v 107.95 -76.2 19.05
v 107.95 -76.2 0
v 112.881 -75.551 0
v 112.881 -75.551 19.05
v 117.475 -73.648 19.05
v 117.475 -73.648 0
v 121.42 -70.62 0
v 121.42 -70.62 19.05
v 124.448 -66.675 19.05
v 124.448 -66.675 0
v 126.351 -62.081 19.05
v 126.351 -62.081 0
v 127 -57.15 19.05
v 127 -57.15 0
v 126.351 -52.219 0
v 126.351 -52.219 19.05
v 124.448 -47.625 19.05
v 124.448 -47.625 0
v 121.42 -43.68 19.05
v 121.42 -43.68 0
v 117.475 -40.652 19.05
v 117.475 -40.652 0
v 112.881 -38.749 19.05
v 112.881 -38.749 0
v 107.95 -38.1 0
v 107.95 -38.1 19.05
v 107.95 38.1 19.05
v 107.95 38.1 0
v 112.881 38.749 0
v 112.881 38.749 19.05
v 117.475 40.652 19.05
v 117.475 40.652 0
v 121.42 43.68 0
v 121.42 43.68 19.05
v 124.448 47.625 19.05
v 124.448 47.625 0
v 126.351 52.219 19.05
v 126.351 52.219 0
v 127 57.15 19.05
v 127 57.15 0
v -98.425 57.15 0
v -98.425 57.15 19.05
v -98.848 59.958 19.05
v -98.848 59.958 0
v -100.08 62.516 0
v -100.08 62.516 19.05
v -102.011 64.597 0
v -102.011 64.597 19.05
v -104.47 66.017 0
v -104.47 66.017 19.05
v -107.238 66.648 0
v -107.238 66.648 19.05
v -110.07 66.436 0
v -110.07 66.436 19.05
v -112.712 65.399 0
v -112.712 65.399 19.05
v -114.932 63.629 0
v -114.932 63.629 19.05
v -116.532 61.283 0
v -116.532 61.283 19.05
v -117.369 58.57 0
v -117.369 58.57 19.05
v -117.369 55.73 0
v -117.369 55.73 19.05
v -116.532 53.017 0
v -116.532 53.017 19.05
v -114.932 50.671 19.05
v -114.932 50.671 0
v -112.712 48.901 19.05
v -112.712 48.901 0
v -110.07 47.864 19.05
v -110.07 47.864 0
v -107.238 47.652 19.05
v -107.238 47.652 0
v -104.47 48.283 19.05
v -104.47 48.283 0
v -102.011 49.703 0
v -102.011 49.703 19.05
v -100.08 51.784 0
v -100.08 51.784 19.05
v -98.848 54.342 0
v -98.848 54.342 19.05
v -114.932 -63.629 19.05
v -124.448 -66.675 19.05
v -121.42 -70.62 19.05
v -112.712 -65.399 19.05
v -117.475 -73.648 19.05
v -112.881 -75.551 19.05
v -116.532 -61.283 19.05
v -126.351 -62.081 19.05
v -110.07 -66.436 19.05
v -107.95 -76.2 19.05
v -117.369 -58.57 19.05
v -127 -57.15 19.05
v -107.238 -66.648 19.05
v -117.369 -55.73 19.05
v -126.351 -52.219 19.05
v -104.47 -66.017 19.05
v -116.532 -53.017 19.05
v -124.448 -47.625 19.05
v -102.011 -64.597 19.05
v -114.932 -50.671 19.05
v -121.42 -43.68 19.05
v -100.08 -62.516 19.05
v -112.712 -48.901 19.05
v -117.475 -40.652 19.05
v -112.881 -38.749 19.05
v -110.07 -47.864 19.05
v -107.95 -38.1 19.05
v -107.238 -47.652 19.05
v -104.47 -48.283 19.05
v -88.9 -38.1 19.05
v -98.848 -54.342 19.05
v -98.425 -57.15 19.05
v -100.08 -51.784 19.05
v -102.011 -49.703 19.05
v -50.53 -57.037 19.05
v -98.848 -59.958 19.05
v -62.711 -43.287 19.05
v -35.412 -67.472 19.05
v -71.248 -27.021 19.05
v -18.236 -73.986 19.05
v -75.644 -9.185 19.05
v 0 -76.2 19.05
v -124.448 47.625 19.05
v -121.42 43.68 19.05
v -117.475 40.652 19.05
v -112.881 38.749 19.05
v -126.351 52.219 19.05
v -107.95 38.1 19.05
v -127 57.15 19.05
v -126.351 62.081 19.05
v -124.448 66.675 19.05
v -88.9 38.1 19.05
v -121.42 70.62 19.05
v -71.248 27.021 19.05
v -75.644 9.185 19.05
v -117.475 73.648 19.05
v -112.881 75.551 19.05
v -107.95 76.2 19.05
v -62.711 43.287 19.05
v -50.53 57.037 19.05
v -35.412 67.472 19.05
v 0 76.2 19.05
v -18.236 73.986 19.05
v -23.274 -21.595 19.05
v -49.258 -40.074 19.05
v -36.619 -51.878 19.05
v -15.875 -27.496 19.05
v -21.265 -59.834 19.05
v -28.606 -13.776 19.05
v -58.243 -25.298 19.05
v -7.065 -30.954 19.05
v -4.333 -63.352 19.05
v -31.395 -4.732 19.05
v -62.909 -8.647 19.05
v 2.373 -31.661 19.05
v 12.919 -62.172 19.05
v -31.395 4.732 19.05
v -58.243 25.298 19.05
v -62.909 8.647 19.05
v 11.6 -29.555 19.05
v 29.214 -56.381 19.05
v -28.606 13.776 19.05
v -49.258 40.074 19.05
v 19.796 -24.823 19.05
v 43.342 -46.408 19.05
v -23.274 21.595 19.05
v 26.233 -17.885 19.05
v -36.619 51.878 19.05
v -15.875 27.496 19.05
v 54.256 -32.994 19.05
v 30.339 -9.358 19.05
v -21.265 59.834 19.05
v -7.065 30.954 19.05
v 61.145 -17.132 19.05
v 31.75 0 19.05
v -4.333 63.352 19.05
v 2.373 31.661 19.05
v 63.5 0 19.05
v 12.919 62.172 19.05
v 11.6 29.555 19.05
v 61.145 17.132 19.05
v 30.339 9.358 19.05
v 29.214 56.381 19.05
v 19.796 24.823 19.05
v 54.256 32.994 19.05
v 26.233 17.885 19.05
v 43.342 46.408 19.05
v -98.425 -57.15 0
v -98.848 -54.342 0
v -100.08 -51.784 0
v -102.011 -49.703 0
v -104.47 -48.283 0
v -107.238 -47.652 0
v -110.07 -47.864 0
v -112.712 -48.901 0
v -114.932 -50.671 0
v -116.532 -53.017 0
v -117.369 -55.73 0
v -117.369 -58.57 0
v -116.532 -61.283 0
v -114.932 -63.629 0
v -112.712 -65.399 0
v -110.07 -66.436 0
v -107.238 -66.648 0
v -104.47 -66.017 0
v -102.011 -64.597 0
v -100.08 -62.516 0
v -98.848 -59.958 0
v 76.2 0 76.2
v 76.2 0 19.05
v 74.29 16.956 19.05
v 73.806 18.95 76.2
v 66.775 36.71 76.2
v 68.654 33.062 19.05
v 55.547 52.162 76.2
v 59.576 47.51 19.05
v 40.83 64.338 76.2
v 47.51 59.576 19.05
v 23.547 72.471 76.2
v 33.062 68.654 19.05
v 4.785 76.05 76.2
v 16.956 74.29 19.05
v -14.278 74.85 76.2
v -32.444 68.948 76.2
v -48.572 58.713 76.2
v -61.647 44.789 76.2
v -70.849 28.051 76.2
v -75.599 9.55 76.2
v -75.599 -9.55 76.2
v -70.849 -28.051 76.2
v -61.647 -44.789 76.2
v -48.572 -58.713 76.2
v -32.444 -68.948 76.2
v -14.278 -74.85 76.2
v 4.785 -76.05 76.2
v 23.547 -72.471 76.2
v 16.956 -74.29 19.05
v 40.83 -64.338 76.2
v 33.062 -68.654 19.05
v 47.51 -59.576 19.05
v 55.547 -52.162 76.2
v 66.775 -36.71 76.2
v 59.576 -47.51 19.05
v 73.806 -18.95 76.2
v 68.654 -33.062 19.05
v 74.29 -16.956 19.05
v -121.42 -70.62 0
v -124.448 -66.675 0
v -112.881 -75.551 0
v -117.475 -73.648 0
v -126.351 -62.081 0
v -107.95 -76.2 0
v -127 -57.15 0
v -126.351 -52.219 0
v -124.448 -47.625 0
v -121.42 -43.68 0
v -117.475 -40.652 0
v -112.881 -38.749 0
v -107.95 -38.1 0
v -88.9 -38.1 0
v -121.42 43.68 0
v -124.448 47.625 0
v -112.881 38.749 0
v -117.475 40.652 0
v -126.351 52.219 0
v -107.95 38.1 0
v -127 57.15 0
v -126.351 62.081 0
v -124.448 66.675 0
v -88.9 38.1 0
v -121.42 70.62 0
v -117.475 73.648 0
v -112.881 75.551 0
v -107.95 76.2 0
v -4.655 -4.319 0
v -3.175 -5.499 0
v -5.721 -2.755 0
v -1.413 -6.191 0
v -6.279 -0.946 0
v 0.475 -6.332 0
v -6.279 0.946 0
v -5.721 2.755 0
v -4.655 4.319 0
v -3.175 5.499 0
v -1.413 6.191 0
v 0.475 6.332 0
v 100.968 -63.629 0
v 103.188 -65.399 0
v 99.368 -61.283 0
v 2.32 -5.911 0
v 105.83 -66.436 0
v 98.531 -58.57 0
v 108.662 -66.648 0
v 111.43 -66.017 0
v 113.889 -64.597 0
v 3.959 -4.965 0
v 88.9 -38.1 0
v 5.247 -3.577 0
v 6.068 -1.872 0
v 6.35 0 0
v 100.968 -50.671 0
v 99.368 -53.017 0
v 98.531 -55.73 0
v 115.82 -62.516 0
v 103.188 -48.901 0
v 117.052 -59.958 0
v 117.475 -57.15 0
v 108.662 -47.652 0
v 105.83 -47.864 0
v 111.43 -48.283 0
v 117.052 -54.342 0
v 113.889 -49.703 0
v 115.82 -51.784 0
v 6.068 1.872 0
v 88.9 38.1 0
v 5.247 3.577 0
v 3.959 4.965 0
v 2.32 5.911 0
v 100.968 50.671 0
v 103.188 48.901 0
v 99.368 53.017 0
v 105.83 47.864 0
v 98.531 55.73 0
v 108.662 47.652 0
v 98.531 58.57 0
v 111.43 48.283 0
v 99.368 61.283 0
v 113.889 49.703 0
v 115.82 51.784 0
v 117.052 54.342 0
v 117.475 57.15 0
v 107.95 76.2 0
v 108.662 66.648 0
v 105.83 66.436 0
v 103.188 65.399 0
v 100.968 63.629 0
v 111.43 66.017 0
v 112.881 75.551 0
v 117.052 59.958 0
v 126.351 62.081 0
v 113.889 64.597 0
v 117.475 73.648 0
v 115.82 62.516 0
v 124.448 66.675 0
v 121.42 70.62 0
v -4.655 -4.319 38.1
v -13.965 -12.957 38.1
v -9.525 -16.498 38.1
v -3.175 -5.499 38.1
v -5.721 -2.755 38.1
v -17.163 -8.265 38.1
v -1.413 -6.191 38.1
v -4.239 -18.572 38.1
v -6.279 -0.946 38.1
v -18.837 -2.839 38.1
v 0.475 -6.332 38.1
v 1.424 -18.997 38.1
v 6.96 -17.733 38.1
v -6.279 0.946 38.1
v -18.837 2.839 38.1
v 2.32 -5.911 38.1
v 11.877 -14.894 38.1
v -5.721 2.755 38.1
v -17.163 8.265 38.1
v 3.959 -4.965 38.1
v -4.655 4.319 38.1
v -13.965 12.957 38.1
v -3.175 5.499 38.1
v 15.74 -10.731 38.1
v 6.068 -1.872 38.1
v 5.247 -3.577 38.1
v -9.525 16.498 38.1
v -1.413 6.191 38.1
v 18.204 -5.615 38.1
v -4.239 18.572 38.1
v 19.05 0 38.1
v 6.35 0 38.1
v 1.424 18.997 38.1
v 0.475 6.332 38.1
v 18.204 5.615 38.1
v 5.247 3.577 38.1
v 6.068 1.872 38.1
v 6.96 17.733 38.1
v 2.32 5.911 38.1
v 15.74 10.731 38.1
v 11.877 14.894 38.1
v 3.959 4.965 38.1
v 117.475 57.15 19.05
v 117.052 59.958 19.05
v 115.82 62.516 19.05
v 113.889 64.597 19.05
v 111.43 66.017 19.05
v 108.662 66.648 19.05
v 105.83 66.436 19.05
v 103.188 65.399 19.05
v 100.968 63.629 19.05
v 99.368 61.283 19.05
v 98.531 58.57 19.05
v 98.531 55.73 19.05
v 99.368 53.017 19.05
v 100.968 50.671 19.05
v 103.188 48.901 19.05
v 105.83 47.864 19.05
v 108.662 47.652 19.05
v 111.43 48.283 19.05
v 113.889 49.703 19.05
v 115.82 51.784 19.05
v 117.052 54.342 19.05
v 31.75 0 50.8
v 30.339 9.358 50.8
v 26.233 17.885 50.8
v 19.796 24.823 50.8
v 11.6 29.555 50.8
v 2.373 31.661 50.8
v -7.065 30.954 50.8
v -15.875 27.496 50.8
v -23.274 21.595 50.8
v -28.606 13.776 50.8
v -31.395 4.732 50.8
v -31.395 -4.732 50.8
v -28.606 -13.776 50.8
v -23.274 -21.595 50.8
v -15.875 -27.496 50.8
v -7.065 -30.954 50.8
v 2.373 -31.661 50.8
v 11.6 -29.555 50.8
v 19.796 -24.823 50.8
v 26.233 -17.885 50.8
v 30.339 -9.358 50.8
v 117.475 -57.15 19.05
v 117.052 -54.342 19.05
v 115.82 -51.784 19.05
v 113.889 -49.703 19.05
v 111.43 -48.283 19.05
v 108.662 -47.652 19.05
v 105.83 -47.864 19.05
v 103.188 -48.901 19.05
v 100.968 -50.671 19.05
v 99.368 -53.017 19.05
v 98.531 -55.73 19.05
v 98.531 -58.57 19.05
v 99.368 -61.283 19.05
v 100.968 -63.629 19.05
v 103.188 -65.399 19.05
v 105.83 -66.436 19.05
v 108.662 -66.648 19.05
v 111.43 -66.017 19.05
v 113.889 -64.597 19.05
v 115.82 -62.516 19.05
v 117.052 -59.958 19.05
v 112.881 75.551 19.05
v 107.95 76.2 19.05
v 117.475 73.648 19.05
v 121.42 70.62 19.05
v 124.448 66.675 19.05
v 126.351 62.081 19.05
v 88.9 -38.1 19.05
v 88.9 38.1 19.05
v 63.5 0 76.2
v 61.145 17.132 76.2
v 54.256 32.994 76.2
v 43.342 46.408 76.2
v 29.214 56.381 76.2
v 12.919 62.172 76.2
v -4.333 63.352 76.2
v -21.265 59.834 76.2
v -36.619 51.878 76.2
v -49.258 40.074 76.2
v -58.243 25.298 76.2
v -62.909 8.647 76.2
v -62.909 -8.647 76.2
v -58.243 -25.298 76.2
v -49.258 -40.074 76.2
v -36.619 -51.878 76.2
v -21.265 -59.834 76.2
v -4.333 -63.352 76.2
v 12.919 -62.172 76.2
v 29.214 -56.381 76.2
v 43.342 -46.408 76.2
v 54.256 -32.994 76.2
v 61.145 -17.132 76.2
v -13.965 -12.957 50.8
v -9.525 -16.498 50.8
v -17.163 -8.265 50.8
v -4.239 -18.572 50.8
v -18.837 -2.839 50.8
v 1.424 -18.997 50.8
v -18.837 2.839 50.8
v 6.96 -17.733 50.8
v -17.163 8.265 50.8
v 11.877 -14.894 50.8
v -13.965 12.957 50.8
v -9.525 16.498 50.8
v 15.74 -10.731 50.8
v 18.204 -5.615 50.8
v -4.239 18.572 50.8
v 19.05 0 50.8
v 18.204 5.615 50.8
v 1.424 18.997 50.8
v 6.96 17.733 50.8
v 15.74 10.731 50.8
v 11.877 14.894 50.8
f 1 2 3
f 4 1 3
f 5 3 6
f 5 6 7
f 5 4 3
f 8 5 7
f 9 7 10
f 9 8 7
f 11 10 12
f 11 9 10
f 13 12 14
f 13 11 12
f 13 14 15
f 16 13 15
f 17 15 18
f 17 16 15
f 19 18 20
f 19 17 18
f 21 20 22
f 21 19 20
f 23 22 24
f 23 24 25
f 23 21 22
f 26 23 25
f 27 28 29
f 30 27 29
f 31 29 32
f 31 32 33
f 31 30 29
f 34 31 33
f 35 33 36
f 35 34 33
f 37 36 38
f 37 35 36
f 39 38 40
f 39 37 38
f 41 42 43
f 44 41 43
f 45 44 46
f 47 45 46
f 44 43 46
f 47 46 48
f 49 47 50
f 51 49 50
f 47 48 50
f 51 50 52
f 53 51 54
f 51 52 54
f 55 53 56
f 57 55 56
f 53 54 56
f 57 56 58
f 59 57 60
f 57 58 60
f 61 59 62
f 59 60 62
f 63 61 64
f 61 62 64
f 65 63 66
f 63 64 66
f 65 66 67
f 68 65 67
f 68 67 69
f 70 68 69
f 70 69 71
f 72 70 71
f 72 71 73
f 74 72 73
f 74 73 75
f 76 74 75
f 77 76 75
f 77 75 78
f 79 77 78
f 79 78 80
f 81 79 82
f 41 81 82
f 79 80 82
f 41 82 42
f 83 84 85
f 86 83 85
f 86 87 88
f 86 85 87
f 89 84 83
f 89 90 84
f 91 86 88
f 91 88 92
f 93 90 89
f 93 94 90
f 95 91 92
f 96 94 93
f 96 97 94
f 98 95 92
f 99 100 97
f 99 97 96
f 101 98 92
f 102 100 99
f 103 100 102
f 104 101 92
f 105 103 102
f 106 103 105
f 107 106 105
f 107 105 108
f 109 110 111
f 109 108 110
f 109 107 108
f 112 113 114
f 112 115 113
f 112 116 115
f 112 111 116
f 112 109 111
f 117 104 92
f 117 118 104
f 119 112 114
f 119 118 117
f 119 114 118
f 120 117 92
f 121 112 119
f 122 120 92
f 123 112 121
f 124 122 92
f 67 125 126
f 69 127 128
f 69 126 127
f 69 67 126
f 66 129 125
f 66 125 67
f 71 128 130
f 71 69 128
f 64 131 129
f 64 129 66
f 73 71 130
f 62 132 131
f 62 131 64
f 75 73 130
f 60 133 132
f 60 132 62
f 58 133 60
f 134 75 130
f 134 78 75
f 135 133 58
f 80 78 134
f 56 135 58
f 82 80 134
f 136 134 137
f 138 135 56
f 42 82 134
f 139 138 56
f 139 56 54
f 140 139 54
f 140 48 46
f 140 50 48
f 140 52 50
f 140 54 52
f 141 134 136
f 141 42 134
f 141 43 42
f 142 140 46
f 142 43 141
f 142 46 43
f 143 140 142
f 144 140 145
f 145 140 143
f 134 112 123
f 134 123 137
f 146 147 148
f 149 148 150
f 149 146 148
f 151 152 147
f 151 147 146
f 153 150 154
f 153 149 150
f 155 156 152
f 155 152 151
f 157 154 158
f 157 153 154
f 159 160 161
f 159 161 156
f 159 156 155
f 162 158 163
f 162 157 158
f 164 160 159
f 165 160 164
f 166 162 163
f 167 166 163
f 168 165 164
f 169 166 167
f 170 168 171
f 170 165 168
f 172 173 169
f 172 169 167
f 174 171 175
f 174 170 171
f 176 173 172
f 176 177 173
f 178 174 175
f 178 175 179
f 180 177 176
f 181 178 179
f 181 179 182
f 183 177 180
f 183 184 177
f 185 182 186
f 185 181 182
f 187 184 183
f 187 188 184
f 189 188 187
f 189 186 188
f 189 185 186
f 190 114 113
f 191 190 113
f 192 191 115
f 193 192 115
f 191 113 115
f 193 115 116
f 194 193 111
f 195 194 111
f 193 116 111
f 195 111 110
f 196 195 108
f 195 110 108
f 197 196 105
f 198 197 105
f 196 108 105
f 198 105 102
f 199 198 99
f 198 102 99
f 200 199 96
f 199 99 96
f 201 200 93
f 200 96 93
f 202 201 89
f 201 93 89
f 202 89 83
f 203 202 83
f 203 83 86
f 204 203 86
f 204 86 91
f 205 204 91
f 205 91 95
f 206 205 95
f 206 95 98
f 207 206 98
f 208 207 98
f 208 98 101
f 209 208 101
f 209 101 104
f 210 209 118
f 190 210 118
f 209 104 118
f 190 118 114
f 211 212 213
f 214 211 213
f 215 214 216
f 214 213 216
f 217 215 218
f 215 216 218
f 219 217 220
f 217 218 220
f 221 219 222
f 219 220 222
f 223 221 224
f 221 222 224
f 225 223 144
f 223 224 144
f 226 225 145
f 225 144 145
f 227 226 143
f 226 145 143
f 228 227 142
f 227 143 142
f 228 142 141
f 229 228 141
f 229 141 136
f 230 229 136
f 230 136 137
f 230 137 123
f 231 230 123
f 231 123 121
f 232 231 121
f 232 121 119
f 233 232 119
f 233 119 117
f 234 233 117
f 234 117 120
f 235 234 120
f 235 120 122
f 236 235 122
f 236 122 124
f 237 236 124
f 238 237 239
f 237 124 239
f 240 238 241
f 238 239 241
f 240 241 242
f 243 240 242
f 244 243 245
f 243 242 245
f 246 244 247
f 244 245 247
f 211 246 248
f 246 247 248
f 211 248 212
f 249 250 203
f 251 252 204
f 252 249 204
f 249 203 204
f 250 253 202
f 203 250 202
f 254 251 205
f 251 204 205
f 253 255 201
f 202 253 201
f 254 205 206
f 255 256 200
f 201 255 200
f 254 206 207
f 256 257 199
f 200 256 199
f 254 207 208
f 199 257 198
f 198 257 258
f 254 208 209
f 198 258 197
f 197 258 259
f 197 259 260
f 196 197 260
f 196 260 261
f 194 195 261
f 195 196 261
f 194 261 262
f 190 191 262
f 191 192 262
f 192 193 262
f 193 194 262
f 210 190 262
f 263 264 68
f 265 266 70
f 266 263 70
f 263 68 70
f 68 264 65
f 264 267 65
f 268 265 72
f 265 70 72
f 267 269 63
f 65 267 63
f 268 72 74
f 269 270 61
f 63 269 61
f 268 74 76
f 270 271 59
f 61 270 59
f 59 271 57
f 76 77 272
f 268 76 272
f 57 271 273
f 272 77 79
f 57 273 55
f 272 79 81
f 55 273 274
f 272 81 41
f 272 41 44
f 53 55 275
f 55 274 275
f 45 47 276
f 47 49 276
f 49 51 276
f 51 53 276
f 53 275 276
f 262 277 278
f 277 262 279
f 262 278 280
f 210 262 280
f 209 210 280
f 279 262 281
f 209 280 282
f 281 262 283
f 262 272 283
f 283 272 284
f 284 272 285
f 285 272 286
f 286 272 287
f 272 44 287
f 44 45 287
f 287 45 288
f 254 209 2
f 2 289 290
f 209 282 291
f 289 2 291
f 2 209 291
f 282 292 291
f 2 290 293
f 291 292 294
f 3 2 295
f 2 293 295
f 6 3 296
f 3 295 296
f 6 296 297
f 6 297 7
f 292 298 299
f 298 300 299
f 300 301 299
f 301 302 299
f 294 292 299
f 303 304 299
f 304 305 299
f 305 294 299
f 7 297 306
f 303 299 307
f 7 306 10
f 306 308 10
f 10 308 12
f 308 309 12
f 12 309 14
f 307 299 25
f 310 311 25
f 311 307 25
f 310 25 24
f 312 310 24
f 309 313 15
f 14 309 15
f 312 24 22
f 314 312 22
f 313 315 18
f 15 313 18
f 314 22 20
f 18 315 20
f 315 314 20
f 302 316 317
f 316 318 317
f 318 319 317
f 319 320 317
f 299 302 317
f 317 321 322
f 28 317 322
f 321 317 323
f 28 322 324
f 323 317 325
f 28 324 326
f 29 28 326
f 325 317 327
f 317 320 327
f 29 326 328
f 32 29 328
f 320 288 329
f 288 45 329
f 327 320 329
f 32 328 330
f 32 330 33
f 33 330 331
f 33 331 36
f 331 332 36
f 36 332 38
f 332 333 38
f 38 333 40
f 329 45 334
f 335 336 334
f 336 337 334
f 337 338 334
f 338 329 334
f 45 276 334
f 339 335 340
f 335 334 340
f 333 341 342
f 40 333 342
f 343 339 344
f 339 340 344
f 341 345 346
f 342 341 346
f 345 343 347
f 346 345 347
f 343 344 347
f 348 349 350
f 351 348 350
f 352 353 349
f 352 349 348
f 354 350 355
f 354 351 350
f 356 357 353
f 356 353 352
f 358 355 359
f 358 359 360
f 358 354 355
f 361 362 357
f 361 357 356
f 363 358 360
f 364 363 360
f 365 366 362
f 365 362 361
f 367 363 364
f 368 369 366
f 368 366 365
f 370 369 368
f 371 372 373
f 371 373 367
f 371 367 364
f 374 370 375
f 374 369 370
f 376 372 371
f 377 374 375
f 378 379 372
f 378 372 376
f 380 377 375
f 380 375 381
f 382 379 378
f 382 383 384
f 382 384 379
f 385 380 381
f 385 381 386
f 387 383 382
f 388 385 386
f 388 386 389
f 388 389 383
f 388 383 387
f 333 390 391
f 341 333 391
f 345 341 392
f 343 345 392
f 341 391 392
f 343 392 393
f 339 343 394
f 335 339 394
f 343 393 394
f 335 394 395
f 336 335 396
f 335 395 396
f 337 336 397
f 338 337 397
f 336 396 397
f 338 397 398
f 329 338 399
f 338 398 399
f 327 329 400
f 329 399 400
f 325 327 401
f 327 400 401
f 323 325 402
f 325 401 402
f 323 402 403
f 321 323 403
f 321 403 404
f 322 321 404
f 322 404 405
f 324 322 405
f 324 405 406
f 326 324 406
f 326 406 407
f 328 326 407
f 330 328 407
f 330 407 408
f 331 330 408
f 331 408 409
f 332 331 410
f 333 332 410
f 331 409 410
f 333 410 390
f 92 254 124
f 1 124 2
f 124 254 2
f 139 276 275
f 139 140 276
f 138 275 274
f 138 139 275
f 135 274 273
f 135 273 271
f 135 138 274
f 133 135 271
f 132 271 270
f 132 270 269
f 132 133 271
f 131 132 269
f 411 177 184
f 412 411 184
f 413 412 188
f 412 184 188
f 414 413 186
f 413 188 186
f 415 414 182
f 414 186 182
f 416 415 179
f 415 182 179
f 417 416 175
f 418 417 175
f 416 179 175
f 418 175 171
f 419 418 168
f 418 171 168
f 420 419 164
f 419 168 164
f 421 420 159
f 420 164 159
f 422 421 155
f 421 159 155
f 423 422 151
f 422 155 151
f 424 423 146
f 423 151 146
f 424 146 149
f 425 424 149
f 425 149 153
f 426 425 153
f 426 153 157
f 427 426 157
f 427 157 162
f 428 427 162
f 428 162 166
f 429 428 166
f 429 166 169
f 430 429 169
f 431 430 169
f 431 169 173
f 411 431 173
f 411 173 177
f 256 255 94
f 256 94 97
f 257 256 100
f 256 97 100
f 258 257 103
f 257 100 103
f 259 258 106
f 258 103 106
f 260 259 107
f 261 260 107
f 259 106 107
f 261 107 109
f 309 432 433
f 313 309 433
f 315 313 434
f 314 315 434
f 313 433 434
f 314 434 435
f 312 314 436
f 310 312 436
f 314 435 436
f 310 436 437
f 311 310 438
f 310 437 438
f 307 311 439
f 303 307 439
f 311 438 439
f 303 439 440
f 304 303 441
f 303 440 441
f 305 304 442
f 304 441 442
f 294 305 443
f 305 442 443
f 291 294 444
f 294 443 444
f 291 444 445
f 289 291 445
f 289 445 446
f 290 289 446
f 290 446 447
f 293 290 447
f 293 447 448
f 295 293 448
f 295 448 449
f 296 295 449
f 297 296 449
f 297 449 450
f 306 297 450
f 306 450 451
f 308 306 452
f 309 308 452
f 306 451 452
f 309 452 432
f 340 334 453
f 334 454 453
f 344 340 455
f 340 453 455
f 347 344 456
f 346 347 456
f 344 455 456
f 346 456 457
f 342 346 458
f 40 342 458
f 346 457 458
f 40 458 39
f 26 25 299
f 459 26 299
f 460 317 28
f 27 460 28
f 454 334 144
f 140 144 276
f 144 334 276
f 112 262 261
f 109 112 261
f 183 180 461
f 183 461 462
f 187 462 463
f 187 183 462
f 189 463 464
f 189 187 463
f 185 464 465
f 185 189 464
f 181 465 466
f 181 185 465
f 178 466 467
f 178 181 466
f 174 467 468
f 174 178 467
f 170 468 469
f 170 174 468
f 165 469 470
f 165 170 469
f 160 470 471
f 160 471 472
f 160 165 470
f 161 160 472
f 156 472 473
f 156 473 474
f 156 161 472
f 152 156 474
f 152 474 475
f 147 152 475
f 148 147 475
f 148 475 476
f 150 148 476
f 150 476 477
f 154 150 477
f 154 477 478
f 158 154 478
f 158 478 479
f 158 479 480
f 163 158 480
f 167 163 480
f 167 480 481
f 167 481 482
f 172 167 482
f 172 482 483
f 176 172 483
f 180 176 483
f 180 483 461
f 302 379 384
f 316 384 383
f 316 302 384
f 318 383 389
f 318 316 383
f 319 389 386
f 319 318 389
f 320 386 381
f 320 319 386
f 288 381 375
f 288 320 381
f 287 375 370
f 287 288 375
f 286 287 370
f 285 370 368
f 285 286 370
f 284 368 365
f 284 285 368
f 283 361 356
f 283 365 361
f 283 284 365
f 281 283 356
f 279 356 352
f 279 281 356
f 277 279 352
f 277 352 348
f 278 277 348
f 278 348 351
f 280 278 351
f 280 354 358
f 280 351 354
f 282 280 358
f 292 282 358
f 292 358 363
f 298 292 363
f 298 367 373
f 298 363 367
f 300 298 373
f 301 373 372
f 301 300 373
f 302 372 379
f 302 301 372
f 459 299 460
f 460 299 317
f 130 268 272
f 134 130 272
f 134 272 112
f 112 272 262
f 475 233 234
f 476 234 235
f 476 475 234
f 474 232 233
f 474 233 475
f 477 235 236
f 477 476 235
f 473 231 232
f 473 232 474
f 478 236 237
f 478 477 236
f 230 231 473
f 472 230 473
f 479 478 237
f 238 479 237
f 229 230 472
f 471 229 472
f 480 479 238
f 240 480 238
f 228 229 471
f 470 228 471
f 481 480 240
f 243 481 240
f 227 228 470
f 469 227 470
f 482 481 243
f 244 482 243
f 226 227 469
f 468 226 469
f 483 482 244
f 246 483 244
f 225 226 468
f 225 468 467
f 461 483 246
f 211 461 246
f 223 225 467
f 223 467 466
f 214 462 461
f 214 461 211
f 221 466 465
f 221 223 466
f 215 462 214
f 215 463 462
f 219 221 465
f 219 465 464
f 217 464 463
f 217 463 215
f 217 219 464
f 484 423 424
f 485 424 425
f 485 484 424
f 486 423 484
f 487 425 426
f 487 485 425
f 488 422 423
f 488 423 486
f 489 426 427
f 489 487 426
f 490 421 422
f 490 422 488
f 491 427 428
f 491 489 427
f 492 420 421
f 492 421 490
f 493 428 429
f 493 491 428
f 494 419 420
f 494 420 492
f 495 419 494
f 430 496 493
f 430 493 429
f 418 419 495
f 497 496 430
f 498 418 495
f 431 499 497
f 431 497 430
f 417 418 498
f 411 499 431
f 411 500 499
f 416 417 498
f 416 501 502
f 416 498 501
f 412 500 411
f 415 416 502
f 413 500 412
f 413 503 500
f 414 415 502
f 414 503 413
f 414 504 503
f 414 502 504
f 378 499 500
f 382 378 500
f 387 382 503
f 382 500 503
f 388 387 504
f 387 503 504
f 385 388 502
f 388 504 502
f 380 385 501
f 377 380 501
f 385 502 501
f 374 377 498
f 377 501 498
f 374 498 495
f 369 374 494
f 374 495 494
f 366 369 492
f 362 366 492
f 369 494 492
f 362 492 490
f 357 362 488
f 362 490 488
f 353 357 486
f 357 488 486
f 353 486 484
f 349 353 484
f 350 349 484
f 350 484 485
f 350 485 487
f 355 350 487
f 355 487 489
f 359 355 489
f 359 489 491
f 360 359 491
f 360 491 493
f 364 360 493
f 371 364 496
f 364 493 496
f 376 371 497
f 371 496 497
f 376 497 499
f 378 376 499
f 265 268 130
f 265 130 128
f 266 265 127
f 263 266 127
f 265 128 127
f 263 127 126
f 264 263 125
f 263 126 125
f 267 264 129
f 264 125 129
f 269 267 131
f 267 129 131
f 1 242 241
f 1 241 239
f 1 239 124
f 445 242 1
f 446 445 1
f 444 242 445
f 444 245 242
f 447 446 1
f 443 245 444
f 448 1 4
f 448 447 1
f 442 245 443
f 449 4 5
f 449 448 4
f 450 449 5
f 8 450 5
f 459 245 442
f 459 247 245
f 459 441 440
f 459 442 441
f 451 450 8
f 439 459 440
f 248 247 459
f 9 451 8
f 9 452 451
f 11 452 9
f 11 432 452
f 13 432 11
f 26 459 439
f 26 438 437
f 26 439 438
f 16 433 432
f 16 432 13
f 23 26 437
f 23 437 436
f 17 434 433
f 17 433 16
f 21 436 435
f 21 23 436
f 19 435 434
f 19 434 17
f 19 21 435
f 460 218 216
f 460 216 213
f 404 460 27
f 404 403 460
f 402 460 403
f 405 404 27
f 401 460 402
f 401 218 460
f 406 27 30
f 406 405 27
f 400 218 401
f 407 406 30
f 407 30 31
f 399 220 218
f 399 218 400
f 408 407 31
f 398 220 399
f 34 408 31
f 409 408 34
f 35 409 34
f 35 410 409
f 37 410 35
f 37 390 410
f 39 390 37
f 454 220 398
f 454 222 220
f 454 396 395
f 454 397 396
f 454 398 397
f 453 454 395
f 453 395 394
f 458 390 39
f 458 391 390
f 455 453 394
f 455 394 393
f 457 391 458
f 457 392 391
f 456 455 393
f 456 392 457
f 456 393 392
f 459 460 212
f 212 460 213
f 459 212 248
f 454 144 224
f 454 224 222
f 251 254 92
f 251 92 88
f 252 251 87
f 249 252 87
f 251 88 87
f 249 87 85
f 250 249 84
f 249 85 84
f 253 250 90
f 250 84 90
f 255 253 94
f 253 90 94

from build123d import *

# Parameters (mm, degrees)
F1_DEPTH  = 19.05
F0_R      = 63.5
F2_DEPTH  = 76.2
F0_R_2    = 31.75
F3_DEPTH  = 19.05
F0_R_3    = 19.05
F0_R_4    = 6.35
F4_DEPTH  = 50.8
F5_R      = 19.05
F6_DEPTH  = 12.7
F7_DEPTH  = 76.201
F8_DEPTH  = 19.05
F9_R      = 19.04999
F10_R     = 9.525
F11_DEPTH = 19.05


# Not quite as in the source:
# - a fillet or chamfer is up to 0.001 mm smaller than in the source, because OpenCascade refuses the exact size


with BuildPart() as f1:
    # F0 (on Top) → F1 (new body)
    with BuildSketch(Plane.XY):
        with BuildLine():
            ThreePointArc((0, 76.2), (53.8815367264, 53.8815367264), (76.2, 0))
            ThreePointArc((76.2, 0), (53.8815367264, -53.8815367264), (0, -76.2))
            Line((0, -76.2), (127, -76.2))
            Line((127, -76.2), (127, -38.1))
            Line((127, -38.1), (88.9, -38.1))
            Line((88.9, -38.1), (88.9, 38.1))
            Line((88.9, 38.1), (127, 38.1))
            Line((127, 38.1), (127, 76.2))
            Line((127, 76.2), (0, 76.2))
        make_face()
    extrude(amount=F1_DEPTH)

    # F0 (on Top) → F2 (join)
    with BuildSketch(Plane.XY):
        with BuildLine():
            ThreePointArc((0, -76.2), (53.8815367264, -53.8815367264), (76.2, 0))
            ThreePointArc((76.2, 0), (53.8815367264, 53.8815367264), (0, 76.2))
            ThreePointArc((0, 76.2), (-76.2, 0), (0, -76.2))
        make_face()
        Circle(F0_R, mode=Mode.SUBTRACT)
    extrude(amount=F2_DEPTH)

    # F0 (on Top) → F3 (join)
    with BuildSketch(Plane.XY):
        Circle(F0_R)
        Circle(F0_R_2, mode=Mode.SUBTRACT)
    extrude(amount=F3_DEPTH)

    # F0 (on Top) → F4 (join)
    with BuildSketch(Plane.XY):
        Circle(F0_R_2)
        Circle(F0_R_3, mode=Mode.SUBTRACT)
        Circle(F0_R_3)
        Circle(F0_R_4, mode=Mode.SUBTRACT)
        Circle(F0_R_4)
    extrude(amount=F4_DEPTH)

    # F5 (on face) → F6 (cut)
    with BuildSketch(Plane.XY.offset(50.8)):
        Circle(F5_R)
    extrude(amount=-F6_DEPTH, mode=Mode.SUBTRACT)

    # F0 (on Top) → F7 (cut, through all)
    with BuildSketch(Plane.XY):
        Circle(F0_R_4)
    extrude(amount=F7_DEPTH, mode=Mode.SUBTRACT)

    # F0 (on Top) → F8 (join)
    with BuildSketch(Plane.XY):
        with BuildLine():
            ThreePointArc((0, -76.2), (-76.2, 0), (0, 76.2))
            Line((0, 76.2), (-127, 76.2))
            Line((-127, 76.2), (-127, 38.1))
            Line((-127, 38.1), (-88.9, 38.1))
            Line((-88.9, 38.1), (-88.9, -38.1))
            Line((-88.9, -38.1), (-127, -38.1))
            Line((-127, -38.1), (-127, -76.2))
            Line((-127, -76.2), (0, -76.2))
        make_face()
    extrude(amount=F8_DEPTH)

    # F9 (radius 19.05 in the source; OpenCascade refuses exactly that, so slightly less here)
    f9_edges = [f1.edges().sort_by_distance(p)[0] for p in [
        (-127, -76.2, 9.525),
        (-127, -38.1, 9.525),
        (-127, 38.1, 9.525),
        (-127, 76.2, 9.525),
        (127, 38.1, 9.525),
        (127, 76.2, 9.525),
        (127, -76.2, 9.525),
        (127, -38.1, 9.525),
    ]]
    fillet(f9_edges, radius=F9_R)

    # F10 (on face) → F11 (cut, through all)
    with BuildSketch(Plane.XY.offset(19.05)):
        with Locations((-107.95, -57.15)):
            Circle(F10_R)
        with Locations((-107.95, 57.15)):
            Circle(F10_R)
        with Locations((107.95, 57.15)):
            Circle(F10_R)
        with Locations((107.95, -57.15)):
            Circle(F10_R)
    extrude(amount=-F11_DEPTH, mode=Mode.SUBTRACT)


solid = f1.part
